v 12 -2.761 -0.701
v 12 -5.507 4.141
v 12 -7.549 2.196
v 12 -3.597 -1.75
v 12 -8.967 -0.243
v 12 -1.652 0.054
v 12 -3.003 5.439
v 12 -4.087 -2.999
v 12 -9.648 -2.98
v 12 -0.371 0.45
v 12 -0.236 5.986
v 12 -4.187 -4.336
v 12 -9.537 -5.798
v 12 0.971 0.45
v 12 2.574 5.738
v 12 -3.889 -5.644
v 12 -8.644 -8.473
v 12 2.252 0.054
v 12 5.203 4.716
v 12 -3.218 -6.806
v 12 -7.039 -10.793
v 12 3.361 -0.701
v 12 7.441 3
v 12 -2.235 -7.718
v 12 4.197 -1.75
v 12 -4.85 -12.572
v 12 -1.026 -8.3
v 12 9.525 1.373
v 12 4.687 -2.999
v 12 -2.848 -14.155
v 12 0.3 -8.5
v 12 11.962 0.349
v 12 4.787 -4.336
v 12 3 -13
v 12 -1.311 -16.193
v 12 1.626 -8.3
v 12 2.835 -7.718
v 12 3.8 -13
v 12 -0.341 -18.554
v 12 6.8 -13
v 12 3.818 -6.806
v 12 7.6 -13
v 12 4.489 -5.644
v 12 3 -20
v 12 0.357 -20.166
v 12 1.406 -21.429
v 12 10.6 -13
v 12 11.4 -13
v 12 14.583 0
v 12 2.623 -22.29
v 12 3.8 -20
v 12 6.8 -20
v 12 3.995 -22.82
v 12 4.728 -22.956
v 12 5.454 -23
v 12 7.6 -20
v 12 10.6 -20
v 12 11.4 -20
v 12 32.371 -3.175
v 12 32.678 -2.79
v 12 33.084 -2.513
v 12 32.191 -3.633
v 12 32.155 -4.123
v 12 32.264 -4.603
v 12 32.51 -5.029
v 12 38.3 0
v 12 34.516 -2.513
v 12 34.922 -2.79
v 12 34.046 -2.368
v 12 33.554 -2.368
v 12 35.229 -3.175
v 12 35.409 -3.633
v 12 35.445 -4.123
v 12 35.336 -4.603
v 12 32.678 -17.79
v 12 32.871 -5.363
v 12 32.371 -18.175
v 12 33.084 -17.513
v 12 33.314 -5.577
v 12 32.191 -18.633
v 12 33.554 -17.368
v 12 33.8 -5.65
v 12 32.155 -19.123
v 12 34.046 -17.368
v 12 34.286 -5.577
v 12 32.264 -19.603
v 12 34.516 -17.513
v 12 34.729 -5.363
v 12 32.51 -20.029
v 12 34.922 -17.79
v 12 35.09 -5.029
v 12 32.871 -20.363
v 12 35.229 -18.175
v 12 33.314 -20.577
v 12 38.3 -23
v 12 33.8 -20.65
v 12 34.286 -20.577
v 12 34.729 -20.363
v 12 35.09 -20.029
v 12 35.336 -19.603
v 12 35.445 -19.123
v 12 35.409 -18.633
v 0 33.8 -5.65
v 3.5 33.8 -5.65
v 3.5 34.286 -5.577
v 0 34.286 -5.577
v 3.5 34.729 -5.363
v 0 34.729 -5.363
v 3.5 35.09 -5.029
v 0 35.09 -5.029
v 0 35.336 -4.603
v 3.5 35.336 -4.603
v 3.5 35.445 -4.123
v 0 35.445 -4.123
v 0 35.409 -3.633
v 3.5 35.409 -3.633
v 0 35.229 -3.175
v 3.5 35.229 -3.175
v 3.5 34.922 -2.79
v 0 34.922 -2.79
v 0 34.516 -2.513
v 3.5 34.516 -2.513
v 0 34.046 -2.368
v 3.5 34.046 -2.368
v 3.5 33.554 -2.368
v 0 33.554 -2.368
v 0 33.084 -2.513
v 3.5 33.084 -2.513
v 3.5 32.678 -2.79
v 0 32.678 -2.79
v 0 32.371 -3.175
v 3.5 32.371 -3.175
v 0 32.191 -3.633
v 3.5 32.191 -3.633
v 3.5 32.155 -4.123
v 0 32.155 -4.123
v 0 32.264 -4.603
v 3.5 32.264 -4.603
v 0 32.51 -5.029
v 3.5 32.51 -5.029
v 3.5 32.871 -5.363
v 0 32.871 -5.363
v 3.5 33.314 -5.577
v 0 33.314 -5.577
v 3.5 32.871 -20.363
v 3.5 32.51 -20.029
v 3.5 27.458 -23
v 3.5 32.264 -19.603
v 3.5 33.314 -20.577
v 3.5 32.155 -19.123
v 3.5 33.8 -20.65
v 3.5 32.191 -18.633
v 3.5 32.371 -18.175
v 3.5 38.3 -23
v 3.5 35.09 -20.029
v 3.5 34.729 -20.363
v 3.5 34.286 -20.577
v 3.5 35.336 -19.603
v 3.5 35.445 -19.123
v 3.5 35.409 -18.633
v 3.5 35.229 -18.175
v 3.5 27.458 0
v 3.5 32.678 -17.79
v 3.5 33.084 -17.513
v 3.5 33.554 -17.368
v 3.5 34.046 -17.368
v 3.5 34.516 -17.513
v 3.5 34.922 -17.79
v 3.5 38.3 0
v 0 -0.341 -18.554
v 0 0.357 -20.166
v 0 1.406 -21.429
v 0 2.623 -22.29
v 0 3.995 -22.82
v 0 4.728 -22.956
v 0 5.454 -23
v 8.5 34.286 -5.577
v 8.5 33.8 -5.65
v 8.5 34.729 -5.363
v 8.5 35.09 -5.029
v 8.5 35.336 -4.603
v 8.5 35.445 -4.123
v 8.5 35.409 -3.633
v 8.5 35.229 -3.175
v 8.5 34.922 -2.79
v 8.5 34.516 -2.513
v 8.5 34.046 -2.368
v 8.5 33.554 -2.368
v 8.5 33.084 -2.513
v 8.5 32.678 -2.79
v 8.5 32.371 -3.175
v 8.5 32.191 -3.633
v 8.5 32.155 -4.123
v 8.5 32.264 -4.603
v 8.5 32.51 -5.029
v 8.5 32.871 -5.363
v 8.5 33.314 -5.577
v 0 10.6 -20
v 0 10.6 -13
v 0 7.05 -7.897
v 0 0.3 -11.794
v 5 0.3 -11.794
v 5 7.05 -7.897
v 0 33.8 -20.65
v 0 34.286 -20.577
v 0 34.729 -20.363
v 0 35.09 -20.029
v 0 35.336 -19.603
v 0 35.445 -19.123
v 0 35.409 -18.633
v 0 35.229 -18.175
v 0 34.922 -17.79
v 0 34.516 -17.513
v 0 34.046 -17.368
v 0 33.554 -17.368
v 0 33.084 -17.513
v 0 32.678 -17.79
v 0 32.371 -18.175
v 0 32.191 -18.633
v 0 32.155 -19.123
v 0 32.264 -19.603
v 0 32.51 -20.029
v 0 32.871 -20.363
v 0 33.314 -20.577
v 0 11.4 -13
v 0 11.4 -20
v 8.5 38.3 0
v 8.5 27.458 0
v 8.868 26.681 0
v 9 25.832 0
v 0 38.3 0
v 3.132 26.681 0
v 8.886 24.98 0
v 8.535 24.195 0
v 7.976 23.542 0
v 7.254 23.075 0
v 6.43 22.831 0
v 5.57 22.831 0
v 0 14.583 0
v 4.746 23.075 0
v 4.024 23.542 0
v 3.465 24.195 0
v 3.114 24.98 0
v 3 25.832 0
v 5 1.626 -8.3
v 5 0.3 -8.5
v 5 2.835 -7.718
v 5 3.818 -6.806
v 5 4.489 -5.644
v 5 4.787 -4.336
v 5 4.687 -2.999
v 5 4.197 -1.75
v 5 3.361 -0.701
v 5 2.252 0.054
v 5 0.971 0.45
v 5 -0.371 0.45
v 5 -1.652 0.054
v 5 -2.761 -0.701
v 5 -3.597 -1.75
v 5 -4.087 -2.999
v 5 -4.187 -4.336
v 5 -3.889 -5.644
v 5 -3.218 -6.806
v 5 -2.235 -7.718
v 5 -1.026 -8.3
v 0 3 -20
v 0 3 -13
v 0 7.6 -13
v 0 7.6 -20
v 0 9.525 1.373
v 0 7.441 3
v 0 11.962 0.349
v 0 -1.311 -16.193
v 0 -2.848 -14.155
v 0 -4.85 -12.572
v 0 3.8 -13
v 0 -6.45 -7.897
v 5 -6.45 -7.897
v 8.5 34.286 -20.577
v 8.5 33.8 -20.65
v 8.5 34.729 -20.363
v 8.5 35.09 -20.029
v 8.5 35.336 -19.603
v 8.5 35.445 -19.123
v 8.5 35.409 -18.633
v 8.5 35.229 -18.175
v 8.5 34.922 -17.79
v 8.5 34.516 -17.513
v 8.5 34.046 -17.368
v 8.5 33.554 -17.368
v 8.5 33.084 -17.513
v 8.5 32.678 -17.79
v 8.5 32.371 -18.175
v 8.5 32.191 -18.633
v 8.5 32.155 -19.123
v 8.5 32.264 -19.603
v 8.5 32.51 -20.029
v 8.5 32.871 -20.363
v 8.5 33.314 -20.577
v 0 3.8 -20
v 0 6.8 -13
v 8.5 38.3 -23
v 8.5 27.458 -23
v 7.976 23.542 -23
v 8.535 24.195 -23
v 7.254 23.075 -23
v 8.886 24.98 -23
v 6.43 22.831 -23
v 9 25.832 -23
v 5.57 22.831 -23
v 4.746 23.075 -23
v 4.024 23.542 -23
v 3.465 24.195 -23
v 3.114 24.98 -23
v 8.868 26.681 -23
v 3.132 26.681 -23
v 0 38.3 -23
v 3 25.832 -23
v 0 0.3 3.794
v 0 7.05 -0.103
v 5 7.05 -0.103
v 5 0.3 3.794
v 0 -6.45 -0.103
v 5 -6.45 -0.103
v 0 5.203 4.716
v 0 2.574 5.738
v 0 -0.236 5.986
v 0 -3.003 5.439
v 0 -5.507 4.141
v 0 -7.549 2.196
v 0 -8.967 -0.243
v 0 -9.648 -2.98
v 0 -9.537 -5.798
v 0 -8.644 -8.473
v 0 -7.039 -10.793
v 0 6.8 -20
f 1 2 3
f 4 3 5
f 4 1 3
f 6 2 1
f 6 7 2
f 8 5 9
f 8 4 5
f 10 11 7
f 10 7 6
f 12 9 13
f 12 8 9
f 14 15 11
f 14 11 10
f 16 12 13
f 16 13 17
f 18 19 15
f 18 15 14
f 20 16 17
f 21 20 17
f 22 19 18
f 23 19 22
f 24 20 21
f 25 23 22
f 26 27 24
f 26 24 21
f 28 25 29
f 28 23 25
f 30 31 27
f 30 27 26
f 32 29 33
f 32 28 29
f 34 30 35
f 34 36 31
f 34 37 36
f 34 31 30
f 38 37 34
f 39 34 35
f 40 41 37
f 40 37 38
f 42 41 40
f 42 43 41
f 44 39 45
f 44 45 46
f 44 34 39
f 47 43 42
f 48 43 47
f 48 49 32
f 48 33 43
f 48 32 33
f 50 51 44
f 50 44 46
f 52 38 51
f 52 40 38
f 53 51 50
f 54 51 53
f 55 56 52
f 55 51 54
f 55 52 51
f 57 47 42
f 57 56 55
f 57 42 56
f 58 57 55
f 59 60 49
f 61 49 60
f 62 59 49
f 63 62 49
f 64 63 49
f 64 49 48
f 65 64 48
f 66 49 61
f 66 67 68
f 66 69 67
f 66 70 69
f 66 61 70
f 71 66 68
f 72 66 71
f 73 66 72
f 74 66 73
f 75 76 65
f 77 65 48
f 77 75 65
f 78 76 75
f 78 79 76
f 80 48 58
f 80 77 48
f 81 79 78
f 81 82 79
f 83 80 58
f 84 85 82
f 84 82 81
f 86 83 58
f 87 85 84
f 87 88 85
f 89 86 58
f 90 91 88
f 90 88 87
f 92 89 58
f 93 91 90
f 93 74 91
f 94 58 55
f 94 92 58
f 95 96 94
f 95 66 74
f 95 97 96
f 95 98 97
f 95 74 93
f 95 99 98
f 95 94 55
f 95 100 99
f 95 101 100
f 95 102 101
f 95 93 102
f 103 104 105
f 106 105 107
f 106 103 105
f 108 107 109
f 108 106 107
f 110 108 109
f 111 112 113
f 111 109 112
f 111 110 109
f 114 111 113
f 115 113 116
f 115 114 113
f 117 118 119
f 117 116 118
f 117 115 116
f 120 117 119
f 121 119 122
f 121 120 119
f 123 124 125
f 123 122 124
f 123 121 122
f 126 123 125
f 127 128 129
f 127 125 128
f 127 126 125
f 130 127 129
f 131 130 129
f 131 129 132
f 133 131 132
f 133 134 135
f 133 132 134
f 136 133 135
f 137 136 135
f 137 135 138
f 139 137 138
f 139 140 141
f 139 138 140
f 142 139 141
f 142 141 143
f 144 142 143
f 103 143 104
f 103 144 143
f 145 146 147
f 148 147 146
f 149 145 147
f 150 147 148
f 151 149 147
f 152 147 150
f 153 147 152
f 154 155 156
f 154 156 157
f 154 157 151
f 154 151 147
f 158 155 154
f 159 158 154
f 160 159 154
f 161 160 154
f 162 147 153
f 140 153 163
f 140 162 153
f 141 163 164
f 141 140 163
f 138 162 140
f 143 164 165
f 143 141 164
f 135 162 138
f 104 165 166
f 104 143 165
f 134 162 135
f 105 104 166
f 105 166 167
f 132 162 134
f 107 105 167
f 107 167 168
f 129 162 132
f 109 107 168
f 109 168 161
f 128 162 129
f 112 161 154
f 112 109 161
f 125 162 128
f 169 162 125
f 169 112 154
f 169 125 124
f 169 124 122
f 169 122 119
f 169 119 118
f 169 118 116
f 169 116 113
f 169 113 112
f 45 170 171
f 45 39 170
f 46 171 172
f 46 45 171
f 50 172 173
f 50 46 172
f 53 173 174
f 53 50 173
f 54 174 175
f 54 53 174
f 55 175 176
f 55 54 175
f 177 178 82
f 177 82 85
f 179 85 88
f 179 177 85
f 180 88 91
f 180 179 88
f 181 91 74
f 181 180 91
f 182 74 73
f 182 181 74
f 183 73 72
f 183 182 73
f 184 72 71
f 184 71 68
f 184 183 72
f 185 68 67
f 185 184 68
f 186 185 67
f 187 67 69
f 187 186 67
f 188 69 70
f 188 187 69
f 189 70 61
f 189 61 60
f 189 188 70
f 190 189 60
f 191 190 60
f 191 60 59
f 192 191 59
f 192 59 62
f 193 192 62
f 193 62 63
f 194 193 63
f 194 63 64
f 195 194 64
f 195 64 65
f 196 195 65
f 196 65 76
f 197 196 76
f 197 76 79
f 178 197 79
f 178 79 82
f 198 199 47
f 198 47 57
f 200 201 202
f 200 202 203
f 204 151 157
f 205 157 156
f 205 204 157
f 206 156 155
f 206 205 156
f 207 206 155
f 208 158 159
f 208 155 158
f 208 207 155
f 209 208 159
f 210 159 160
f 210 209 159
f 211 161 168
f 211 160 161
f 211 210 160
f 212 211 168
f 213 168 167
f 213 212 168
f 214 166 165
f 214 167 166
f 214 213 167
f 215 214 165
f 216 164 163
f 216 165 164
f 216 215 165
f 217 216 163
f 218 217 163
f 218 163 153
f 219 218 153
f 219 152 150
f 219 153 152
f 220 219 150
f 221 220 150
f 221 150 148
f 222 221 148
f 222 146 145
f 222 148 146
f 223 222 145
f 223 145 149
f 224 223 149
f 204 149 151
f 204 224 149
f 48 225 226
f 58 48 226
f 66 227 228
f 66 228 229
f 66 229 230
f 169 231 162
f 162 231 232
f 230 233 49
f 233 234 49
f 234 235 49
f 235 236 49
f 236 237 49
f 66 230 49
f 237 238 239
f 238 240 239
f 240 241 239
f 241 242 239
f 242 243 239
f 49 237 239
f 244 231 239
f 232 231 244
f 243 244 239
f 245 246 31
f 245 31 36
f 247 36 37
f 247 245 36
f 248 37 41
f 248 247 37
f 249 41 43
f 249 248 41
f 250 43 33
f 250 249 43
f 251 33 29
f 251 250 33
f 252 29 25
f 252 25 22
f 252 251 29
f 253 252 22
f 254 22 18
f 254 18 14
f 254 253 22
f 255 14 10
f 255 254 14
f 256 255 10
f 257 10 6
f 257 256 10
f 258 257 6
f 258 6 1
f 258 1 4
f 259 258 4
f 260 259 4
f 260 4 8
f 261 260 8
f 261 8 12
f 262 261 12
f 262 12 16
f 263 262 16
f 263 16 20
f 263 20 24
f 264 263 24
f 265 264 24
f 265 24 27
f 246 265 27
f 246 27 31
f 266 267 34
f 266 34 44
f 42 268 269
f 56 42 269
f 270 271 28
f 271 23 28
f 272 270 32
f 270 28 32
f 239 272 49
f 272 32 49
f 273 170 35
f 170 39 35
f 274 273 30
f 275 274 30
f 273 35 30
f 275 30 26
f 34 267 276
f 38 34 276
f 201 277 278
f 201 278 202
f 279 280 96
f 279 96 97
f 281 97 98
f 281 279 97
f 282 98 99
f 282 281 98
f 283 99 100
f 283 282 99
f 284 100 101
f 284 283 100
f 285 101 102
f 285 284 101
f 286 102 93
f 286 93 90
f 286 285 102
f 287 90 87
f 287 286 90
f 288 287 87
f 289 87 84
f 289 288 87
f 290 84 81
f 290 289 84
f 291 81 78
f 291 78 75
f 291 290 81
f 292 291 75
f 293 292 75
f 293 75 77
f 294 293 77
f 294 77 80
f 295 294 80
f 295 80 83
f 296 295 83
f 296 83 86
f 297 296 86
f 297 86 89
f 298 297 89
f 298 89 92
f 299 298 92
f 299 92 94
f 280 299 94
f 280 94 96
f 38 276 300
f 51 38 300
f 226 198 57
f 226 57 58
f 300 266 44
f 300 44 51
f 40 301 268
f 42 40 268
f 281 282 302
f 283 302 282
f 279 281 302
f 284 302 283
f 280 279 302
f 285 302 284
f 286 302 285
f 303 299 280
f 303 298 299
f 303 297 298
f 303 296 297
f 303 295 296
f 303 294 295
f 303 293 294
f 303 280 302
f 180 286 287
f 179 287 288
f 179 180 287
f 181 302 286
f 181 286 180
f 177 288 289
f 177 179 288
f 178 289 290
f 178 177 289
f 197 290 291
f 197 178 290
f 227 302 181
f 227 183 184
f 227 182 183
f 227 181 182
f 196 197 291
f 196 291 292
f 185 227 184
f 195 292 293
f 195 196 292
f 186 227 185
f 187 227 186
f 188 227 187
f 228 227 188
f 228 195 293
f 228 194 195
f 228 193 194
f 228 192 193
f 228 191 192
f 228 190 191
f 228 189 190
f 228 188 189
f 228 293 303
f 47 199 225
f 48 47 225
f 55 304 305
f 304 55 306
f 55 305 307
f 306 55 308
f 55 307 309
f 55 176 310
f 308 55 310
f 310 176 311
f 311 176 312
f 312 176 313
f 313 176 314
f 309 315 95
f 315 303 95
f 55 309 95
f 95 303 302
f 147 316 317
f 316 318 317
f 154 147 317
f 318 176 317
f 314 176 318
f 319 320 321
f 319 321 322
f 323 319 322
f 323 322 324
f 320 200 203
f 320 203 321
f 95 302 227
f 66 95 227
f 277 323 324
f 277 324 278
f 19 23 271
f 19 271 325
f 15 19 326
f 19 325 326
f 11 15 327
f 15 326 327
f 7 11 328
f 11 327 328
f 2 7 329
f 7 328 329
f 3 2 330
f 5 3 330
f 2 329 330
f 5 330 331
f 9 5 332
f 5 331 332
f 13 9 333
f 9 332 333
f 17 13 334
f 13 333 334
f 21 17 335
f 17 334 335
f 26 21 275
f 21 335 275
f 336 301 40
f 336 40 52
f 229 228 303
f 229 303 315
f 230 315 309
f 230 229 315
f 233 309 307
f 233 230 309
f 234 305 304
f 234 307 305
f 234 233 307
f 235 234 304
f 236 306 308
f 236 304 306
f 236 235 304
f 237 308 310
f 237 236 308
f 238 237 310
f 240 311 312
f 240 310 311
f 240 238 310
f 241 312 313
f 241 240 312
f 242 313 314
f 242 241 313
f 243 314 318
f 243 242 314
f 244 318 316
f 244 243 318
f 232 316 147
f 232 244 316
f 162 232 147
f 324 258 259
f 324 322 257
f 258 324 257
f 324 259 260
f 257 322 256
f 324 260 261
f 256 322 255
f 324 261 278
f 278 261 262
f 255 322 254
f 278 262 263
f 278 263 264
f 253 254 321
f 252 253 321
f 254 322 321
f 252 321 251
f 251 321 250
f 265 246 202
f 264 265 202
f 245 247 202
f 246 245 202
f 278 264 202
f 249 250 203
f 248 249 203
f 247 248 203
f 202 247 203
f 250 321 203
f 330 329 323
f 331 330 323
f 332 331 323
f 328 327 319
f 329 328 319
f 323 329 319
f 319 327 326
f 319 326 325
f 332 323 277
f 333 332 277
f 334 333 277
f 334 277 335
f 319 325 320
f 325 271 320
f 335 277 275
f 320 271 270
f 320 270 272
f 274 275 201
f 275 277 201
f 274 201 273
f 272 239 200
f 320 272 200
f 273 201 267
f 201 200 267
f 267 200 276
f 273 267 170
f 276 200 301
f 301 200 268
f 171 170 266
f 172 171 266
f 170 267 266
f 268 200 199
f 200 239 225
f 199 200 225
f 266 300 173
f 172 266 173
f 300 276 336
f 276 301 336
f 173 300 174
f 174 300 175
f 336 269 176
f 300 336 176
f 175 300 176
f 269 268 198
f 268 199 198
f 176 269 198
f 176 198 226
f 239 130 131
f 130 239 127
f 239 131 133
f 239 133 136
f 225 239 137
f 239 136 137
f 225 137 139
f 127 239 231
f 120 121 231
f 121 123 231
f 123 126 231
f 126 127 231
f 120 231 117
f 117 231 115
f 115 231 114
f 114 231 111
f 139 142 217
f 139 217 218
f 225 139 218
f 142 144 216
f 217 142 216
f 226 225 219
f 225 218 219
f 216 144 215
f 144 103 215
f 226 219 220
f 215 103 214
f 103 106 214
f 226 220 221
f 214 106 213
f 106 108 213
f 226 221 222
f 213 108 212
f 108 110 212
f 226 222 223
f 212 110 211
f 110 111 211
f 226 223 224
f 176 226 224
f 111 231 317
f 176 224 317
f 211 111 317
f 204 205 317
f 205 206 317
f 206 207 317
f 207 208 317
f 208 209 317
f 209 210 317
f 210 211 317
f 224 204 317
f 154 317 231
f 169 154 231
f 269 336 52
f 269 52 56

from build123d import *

# Parameters (mm, degrees)
SKIZZE1_R                       = 1.65
SKIZZE1_R_2                     = 4.5
SKIZZE1_W                       = 7
SKIZZE1_H                       = 0.8
AUFSATZ_LINEAR_AUSTRAGEN1_DEPTH = 12
SCHNITT_LINEAR_AUSTRAGEN2_DEPTH = 47.258945081
SCHNITT_LINEAR_AUSTRAGEN4_DEPTH = 5
VERRUNDUNG1_R                   = 10
VERRUNDUNG3_R                   = 6


with BuildPart() as part:
    # Skizze1 → Aufsatz-Linear austragen1 (new body)
    with BuildSketch(Plane(origin=(0, 0, 0), x_dir=(0, 0, -1), z_dir=(1, 0, 0))):
        with BuildLine():
            Line((13.995498987, 0), (23, 0))
            Line((23, 0), (23, 38.3))
            Line((23, 38.3), (0, 38.3))
            Line((0, 38.3), (0, 9.46515139))
            ThreePointArc((0, 9.46515139), (-1.602122342, -7.983491128), (13.995498987, 0))
        make_face()
        with Locations((4, 33.8)):
            Circle(SKIZZE1_R, mode=Mode.SUBTRACT)
        with Locations((19, 33.8)):
            Circle(SKIZZE1_R, mode=Mode.SUBTRACT)
        with Locations((4, 0.3)):
            Circle(SKIZZE1_R_2, mode=Mode.SUBTRACT)
        with Locations((16.5, 3.4)):
            Rectangle(SKIZZE1_W, SKIZZE1_H, mode=Mode.SUBTRACT)
        with Locations((16.5, 7.2)):
            Rectangle(SKIZZE1_W, SKIZZE1_H, mode=Mode.SUBTRACT)
        with Locations((16.5, 11)):
            Rectangle(SKIZZE1_W, SKIZZE1_H, mode=Mode.SUBTRACT)
    extrude(amount=AUFSATZ_LINEAR_AUSTRAGEN1_DEPTH)

    # Skizze2 → Schnitt-Linear austragen2 (cut, through all)
    with BuildSketch(Plane.XY):
        with BuildLine():
            Line((3.5, 38.3), (8.5, 38.3))
            Line((8.5, 38.3), (8.5, 27.458312395))
            ThreePointArc((8.5, 27.458312395), (6, 22.8), (3.5, 27.458312395))
            Line((3.5, 27.458312395), (3.5, 38.3))
        make_face()
    extrude(amount=-SCHNITT_LINEAR_AUSTRAGEN2_DEPTH, mode=Mode.SUBTRACT)

    # Skizze5 → Schnitt-Linear austragen4 (cut)
    with BuildSketch(Plane(origin=(0, 0, 0), x_dir=(0, 0, -1), z_dir=(1, 0, 0))):
        Polygon((0.102885683, 7.05), (-3.794228634, 0.3), (0.102885683, -6.45), (7.897114317, -6.45), (11.794228634, 0.3), (7.897114317, 7.05), align=None)
    extrude(amount=SCHNITT_LINEAR_AUSTRAGEN4_DEPTH, mode=Mode.SUBTRACT)

    # Verrundung1
    verrundung1_edges = [part.edges().sort_by_distance(p)[0] for p in [
        (6, 0, -13.995498987),
        (6, 9.46515139, 0),
    ]]
    fillet(verrundung1_edges, radius=VERRUNDUNG1_R)

    # Verrundung3
    verrundung3_edges = [part.edges().sort_by_distance(p)[0] for p in [
        (6, 0, -23),
    ]]
    fillet(verrundung3_edges, radius=VERRUNDUNG3_R)


solid = part.part
